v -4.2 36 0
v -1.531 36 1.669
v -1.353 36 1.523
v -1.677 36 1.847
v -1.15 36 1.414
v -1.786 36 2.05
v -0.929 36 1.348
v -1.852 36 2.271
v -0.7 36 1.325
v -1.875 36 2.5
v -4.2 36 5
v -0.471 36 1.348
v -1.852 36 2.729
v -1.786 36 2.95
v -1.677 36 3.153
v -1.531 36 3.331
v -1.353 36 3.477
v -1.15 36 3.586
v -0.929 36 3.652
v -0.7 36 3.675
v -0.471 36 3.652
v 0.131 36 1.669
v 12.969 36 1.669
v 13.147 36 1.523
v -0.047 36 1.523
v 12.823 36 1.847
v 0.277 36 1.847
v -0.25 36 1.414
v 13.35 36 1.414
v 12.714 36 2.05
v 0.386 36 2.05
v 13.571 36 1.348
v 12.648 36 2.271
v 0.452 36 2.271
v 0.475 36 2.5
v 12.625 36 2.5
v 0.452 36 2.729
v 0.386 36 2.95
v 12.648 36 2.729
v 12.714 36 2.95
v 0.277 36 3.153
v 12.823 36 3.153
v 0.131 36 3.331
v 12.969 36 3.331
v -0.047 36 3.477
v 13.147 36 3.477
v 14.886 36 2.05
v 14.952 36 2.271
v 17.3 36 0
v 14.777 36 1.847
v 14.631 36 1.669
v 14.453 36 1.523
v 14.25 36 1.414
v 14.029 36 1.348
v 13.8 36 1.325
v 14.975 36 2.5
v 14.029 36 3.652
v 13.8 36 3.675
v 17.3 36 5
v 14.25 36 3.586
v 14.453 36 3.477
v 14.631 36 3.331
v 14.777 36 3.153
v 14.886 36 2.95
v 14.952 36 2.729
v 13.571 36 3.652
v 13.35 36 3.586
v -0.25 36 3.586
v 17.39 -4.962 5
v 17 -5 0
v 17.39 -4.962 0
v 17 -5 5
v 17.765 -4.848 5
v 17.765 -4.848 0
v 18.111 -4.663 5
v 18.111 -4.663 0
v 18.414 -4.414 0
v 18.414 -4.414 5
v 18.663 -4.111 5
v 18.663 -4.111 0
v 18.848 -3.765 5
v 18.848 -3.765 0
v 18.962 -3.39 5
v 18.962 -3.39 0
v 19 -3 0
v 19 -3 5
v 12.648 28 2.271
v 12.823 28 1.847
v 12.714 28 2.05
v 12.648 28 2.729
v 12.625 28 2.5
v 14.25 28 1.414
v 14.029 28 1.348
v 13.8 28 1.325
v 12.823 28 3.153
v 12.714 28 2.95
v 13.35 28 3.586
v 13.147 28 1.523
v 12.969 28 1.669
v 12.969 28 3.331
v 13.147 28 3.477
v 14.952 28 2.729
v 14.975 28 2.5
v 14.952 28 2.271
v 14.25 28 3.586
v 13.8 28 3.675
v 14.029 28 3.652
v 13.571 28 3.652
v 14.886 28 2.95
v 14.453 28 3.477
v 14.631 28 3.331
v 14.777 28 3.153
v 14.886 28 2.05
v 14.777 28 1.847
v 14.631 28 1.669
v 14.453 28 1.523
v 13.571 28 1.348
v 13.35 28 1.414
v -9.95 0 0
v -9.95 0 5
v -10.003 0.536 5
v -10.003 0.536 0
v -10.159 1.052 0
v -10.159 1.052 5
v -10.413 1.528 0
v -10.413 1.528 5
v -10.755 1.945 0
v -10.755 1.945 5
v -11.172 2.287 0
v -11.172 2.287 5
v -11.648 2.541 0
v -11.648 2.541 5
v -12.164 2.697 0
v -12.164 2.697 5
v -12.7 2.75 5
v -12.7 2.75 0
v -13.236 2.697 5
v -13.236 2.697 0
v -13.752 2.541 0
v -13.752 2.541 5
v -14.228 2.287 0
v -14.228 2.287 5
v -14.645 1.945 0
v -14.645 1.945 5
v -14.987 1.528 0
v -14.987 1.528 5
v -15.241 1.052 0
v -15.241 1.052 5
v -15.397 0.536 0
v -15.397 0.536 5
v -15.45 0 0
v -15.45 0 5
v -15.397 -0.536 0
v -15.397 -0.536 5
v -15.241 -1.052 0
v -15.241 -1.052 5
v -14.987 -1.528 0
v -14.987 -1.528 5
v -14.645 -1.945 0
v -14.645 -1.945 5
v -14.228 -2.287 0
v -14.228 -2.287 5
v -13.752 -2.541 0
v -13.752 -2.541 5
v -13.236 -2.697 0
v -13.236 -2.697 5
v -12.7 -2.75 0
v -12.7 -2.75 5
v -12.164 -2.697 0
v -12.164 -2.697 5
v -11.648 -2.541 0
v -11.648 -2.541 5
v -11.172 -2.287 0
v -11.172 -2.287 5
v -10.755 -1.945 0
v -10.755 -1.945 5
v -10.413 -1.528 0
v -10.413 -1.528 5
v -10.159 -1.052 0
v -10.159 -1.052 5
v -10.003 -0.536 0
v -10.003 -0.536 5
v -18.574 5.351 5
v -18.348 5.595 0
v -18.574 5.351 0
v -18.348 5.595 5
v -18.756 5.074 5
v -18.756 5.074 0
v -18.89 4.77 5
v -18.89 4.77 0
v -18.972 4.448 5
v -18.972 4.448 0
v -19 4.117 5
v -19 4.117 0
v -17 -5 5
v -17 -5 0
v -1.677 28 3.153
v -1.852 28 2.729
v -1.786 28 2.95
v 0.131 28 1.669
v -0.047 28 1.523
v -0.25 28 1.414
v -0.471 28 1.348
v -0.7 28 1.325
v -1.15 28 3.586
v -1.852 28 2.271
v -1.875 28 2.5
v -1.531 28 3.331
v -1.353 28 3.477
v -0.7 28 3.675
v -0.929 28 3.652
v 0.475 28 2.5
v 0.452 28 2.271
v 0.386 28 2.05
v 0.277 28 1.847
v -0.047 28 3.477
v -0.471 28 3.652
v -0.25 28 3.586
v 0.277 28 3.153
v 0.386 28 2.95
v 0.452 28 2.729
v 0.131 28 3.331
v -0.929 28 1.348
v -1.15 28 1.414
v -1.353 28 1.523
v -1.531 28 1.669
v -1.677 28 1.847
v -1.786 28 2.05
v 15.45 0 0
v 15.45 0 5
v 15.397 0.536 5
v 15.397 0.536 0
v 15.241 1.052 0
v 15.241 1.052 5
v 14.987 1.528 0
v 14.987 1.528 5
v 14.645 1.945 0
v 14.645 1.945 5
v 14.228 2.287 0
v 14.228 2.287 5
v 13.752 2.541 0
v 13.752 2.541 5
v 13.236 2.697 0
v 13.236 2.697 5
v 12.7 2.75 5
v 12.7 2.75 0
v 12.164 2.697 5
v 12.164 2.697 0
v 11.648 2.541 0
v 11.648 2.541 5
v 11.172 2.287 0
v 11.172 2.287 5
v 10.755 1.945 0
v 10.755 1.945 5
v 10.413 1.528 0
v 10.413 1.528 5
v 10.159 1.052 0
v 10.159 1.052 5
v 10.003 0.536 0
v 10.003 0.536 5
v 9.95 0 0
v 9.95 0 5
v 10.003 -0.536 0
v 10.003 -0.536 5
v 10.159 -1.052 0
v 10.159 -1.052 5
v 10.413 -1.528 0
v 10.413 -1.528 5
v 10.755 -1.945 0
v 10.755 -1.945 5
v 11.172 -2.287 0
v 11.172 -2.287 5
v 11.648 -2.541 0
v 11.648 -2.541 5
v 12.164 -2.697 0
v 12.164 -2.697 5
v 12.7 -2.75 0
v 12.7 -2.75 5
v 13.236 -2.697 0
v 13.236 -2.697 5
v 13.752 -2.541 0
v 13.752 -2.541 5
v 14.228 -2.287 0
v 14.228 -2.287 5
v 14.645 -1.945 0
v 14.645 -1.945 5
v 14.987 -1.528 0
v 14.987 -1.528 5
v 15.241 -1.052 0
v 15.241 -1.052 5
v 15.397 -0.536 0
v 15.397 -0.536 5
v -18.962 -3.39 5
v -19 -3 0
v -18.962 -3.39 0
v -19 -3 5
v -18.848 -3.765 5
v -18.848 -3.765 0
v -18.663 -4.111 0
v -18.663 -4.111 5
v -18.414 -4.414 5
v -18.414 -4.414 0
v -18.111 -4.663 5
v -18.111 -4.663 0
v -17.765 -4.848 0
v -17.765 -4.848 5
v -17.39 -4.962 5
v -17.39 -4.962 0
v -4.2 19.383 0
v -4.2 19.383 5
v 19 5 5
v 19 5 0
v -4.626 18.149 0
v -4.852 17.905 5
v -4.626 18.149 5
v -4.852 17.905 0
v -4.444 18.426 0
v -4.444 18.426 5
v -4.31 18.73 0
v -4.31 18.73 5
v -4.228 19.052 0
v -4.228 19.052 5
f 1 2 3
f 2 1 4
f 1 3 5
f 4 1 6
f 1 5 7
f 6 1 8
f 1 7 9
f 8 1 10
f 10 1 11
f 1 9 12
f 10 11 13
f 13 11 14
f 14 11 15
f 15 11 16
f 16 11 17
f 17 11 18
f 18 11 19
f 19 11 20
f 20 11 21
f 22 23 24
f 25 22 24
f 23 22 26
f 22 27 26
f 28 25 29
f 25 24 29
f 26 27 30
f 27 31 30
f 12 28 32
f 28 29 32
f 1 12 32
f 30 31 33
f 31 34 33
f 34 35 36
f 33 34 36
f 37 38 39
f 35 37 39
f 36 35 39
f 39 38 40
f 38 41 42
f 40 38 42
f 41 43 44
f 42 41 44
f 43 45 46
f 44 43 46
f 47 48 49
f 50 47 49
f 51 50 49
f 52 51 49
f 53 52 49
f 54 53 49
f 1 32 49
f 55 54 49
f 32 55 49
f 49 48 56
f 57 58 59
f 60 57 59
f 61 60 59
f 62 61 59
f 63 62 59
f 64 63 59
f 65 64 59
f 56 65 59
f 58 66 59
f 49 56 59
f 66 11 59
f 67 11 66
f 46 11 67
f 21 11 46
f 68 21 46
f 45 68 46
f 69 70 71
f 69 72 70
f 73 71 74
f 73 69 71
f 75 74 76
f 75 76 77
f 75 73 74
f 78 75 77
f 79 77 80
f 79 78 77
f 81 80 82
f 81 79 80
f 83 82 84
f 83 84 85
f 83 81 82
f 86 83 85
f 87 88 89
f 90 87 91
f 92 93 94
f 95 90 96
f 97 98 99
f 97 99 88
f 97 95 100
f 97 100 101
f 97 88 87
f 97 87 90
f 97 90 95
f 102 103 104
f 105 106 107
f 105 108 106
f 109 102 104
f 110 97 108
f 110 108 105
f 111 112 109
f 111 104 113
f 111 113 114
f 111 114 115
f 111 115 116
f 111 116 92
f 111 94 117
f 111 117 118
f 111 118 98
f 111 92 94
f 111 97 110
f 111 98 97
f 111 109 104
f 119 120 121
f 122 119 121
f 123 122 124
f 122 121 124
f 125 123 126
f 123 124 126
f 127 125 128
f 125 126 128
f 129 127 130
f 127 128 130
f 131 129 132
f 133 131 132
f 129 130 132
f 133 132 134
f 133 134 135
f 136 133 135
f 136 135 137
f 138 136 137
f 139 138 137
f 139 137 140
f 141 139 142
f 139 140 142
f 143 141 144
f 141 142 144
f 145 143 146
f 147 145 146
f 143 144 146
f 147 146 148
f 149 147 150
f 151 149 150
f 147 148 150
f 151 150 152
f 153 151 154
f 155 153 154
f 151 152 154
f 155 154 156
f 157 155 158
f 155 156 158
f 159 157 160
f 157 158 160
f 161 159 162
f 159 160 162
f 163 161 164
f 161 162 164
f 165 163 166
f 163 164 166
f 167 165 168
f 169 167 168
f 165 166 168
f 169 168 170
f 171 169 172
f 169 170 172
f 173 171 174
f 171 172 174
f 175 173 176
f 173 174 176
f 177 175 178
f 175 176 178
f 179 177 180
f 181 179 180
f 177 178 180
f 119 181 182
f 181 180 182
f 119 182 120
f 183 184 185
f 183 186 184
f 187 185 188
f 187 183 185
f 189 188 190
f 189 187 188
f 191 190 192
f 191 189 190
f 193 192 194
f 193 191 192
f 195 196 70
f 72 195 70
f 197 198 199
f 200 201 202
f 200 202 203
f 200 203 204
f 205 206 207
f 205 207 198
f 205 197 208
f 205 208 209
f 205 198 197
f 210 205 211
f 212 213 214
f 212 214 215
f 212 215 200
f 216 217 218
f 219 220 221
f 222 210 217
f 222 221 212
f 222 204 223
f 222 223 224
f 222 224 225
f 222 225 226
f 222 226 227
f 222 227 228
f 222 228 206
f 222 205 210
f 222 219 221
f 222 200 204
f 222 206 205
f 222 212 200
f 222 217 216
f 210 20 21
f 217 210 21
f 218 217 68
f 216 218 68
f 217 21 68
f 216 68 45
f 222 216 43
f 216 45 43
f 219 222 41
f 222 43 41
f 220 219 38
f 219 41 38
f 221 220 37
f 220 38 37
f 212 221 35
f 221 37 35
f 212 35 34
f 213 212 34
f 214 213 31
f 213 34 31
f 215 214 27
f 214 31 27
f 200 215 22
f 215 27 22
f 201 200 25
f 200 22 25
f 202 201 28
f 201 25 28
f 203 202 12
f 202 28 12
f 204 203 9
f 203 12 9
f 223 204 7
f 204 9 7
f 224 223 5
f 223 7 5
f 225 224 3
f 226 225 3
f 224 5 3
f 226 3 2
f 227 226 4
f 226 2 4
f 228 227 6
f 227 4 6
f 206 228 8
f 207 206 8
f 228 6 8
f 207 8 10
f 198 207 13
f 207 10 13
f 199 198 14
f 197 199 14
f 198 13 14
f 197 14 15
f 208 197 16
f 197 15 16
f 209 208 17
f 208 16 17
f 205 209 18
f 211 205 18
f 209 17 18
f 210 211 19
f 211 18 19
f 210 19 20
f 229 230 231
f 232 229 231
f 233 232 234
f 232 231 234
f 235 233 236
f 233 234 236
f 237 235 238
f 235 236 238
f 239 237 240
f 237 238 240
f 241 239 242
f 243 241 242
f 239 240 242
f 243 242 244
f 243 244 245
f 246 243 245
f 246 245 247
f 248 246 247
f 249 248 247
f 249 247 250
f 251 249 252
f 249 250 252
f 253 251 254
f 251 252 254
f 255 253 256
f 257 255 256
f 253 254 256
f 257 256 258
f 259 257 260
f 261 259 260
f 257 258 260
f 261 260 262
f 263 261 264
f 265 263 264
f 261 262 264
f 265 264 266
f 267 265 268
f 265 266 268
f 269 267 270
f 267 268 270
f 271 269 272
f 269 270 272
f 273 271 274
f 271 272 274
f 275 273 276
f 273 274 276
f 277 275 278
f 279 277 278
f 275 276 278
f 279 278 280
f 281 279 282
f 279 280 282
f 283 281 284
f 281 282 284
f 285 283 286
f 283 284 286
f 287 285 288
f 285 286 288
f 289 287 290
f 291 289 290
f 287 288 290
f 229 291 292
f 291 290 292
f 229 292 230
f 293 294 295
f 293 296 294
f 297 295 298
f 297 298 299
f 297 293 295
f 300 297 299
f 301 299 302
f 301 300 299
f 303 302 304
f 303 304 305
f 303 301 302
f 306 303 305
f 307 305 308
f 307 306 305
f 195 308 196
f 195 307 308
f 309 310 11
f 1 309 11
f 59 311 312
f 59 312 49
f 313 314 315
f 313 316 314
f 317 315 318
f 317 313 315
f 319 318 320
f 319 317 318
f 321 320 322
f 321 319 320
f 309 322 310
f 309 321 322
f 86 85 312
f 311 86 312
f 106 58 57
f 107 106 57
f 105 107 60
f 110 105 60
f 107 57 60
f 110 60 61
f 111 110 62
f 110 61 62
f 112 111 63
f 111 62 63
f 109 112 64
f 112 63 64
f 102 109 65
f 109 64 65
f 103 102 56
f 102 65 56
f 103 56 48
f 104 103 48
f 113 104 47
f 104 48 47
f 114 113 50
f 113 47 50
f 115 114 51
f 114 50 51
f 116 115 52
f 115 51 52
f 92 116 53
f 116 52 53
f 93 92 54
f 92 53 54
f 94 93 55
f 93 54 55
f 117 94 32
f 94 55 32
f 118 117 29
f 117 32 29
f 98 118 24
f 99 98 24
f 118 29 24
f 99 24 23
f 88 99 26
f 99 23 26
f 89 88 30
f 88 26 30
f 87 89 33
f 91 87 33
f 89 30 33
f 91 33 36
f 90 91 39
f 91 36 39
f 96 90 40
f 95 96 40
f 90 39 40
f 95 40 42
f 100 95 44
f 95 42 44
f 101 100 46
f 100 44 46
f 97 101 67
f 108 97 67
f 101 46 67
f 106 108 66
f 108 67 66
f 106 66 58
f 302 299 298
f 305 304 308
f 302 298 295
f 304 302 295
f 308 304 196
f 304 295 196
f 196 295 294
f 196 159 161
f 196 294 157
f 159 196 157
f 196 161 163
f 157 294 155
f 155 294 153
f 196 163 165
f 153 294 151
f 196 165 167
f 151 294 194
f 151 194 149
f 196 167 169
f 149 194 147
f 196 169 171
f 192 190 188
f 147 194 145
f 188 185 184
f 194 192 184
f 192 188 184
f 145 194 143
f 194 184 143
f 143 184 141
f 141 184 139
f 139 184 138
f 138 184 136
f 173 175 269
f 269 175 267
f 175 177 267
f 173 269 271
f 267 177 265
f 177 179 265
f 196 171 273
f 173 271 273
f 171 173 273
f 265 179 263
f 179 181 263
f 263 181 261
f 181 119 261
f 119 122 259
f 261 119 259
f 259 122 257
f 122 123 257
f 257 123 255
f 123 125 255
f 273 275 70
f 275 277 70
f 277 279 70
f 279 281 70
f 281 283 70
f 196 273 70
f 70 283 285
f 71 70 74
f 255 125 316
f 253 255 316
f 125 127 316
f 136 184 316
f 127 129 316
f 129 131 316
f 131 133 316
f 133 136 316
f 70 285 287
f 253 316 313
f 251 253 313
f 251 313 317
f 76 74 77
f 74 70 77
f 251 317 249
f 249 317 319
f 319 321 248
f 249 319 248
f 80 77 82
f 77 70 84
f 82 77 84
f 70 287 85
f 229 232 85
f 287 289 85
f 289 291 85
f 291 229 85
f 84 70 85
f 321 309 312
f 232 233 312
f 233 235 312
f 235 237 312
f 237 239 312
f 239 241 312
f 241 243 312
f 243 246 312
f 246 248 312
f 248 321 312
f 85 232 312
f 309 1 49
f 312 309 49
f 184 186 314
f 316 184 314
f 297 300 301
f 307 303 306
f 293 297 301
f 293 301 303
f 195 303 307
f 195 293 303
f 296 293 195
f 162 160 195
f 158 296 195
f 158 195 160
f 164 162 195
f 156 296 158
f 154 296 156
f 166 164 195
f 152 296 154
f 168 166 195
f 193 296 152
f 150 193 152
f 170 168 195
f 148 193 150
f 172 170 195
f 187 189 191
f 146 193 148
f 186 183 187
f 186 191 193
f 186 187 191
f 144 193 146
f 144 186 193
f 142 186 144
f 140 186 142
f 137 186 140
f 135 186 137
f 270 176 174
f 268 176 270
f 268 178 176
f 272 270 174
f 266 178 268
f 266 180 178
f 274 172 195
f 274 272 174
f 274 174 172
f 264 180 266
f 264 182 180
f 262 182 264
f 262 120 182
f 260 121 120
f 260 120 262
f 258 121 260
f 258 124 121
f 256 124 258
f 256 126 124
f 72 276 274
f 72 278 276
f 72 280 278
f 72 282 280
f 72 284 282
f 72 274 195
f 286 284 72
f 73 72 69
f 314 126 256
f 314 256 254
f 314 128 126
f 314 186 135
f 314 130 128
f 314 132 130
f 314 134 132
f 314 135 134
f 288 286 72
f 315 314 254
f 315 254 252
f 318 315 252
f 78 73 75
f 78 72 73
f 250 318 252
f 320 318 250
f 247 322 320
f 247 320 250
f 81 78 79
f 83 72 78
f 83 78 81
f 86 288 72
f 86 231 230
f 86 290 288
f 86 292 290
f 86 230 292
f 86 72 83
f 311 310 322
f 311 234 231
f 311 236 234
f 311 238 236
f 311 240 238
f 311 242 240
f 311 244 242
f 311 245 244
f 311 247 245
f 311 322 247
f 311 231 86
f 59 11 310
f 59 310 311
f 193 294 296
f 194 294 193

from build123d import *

# Parameters (mm, degrees)
SKETCH1_W           = 38
SKETCH1_H           = 10
BOSS_EXTRUDE1_DEPTH = 5
SKETCH2_R           = 2.75
CUT_EXTRUDE1_DEPTH  = 5
SKETCH3_W           = 21.5
SKETCH3_H           = 31
BOSS_EXTRUDE2_DEPTH = 5
BOSS_EXTRUDE6_DEPTH = 5
SKETCH10_R          = 1.175
CUT_EXTRUDE4_DEPTH  = 8
FILLET2_R           = 2
BOSS_EXTRUDE7_DEPTH = 5


with BuildPart() as part:
    # Sketch1 → Boss-Extrude1 (new body)
    with BuildSketch(Plane.XY):
        Rectangle(SKETCH1_W, SKETCH1_H)
    extrude(amount=BOSS_EXTRUDE1_DEPTH)

    # Sketch2 → Cut-Extrude1 (cut)
    with BuildSketch(Plane.XY.offset(5)):
        with Locations((-12.7, 0)):
            Circle(SKETCH2_R)
        with Locations((12.7, 0)):
            Circle(SKETCH2_R)
    extrude(amount=-CUT_EXTRUDE1_DEPTH, mode=Mode.SUBTRACT)

    # Sketch3 → Boss-Extrude2 (add)
    with BuildSketch(Plane.XY.offset(5)):
        with Locations((6.55, 20.5)):
            Rectangle(SKETCH3_W, SKETCH3_H)
    extrude(amount=-BOSS_EXTRUDE2_DEPTH)

    # Sketch8 → Boss-Extrude6 (add)
    with BuildSketch(Plane.XY.offset(5)):
        Polygon((-4.2, 5), (-19, 5), (-4.2, 18.5), align=None)
    extrude(amount=-BOSS_EXTRUDE6_DEPTH)

    # Sketch10 → Cut-Extrude4 (cut)
    with BuildSketch(Plane(origin=(0, 36, 0), x_dir=(1, 0, 0), z_dir=(0, 1, 0))):
        with Locations(Location((-0.7, -2.5, 0), (0, 0, 270))):
            Circle(SKETCH10_R)
        with Locations(Location((13.8, -2.5, 0), (0, 0, 270))):
            Circle(SKETCH10_R)
    extrude(amount=-CUT_EXTRUDE4_DEPTH, mode=Mode.SUBTRACT)

    # Fillet2
    fillet2_edges = [part.edges().sort_by_distance(p)[0] for p in [
        (-4.2, 18.5, 2.5),
        (19, -5, 2.5),
        (-19, -5, 2.5),
        (-19, 5, 2.5),
    ]]
    fillet(fillet2_edges, radius=FILLET2_R)

    # Sketch11 → Boss-Extrude7 (add)
    with BuildSketch(Plane.XY.offset(5)):
        Polygon((19, 5), (17.3, 36), (17.3, 5), align=None)
    extrude(amount=-BOSS_EXTRUDE7_DEPTH)


solid = part.part
